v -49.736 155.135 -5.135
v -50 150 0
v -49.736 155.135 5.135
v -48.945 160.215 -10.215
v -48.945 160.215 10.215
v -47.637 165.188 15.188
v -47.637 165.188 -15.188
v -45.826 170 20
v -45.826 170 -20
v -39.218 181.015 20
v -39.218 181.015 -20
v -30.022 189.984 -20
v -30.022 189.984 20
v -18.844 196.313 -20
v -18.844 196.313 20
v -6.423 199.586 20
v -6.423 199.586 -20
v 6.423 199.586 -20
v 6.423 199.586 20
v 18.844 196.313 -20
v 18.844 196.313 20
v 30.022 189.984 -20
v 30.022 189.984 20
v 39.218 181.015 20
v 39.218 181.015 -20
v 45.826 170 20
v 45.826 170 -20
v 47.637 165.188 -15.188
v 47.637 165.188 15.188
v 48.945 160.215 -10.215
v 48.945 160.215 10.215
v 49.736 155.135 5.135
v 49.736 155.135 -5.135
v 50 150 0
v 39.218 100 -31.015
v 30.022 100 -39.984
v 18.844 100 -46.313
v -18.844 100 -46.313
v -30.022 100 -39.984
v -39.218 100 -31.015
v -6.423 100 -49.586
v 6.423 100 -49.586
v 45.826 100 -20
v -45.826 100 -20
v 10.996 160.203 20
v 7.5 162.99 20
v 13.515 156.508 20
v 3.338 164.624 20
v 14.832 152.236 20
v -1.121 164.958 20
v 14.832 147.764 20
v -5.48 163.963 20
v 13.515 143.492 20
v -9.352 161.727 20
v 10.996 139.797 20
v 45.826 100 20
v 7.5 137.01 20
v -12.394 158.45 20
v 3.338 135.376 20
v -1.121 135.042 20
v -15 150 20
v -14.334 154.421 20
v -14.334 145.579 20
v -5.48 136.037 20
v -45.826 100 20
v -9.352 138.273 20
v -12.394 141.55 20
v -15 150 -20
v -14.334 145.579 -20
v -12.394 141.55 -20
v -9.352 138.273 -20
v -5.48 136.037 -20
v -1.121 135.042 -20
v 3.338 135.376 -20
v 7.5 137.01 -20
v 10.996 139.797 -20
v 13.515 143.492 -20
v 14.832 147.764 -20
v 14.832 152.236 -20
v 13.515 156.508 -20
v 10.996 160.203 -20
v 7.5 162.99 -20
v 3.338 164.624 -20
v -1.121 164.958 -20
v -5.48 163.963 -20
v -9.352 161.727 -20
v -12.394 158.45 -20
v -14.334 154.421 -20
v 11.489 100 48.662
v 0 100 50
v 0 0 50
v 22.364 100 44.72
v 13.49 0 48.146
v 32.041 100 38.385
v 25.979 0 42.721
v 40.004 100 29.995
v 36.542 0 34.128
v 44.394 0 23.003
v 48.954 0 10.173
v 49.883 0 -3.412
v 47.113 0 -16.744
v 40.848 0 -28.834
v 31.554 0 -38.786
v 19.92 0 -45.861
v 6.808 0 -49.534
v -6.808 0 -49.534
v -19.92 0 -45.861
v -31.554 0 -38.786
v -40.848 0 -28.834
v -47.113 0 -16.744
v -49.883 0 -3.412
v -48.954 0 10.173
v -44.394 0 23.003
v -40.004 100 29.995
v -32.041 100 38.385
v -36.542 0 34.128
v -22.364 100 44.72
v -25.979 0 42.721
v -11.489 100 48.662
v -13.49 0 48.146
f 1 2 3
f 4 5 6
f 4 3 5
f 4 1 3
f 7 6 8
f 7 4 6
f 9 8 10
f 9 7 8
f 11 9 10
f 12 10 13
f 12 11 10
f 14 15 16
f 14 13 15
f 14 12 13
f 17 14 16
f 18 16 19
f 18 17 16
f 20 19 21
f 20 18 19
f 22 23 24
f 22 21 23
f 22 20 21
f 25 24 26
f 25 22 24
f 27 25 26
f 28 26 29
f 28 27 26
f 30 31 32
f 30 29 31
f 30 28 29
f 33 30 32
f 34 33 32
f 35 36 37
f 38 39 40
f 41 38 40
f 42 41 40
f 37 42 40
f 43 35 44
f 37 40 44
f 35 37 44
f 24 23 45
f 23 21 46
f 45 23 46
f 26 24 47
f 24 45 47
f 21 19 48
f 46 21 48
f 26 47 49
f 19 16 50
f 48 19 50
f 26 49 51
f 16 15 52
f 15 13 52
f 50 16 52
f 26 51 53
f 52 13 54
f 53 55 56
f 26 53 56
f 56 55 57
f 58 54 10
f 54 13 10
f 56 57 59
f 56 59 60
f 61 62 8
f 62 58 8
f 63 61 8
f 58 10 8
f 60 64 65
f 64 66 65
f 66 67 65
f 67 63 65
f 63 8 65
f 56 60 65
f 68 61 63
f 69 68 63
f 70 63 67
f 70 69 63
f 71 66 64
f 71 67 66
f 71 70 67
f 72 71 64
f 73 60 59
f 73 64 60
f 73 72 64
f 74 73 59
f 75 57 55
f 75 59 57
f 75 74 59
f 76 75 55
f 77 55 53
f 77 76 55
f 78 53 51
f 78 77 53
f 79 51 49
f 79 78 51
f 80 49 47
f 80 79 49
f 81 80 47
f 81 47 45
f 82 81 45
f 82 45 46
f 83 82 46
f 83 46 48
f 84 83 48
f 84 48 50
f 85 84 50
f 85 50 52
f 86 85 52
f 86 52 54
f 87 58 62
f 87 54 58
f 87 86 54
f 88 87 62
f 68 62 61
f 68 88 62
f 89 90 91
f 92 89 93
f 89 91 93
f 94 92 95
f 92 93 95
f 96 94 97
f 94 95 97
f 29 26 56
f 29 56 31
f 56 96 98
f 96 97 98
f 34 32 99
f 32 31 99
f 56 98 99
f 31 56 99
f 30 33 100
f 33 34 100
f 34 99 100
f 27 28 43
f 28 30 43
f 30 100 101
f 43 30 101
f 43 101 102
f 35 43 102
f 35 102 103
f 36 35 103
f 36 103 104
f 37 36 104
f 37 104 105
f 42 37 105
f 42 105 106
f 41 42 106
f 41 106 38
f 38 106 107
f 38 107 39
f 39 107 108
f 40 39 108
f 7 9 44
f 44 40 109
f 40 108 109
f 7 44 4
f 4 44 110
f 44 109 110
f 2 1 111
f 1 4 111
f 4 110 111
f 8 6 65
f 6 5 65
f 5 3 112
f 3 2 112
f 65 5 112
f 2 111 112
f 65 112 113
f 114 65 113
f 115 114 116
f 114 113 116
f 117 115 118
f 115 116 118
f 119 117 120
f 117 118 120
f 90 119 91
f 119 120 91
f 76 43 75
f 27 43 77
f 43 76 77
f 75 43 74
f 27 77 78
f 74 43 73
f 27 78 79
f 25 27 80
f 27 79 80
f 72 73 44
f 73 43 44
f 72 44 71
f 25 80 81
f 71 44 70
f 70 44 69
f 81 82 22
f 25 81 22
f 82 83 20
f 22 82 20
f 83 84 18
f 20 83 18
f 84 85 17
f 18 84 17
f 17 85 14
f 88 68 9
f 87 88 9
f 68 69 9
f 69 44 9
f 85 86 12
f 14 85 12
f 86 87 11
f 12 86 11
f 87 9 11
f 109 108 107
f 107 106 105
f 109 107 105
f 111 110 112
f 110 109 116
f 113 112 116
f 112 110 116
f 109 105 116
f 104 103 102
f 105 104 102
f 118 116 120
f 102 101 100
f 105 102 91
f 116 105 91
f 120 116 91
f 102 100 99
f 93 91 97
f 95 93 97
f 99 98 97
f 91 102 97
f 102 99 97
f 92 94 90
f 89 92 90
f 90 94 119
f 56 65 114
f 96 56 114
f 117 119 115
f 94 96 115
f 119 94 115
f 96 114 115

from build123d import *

# Parameters (mm, degrees)
SKETCH_1_R               = 50
EXTRUDE_1_DEPTH          = 200
CUT_EXTRUDE_1_DEPTH      = 200
CUT_EXTRUDE_1_DEPTH_BACK = 200
CUT_EXTRUDE_4_DEPTH      = 200
CUT_EXTRUDE_4_DEPTH_BACK = 200
CUT_EXTRUDE_5_DEPTH      = 200
CUT_EXTRUDE_5_DEPTH_BACK = 200
SKETCH_5_R               = 15


with BuildPart() as part:
    # 草图1 → 凸台-拉伸1 (new body)
    with BuildSketch(Plane(origin=(0, 0, 0), x_dir=(1, 0, 0), z_dir=(0, 1, 0))):
        Circle(SKETCH_1_R)
    extrude(amount=EXTRUDE_1_DEPTH)

    # 草图2 → 切除-拉伸1 (cut, two sides: drawn at the far end of the back side and taken through both)
    with BuildSketch(Plane(origin=(0, 0, 0), x_dir=(0, 0, -1), z_dir=(1, 0, 0)).offset(-CUT_EXTRUDE_1_DEPTH_BACK)):
        Polygon((-70, 250), (70, 250), (70, 100), (20, 100), (20, 240), (-20, 240), (-20, 100), (-70, 100), align=None)
    extrude(amount=CUT_EXTRUDE_1_DEPTH + CUT_EXTRUDE_1_DEPTH_BACK, mode=Mode.SUBTRACT)

    # 草图3 → 切除-拉伸4 (cut, two sides: drawn at the far end of the back side and taken through both)
    with BuildSketch(Plane.XY.offset(20).offset(-CUT_EXTRUDE_4_DEPTH_BACK)):
        with BuildLine():
            Line((50, 150), (108.18036677, 150))
            Line((108.18036677, 150), (108.18036677, 270))
            Line((108.18036677, 270), (-86.328849113, 270))
            Line((-86.328849113, 270), (-86.328849113, 150))
            Line((-86.328849113, 150), (-50, 150))
            ThreePointArc((-50, 150), (0, 200), (50, 150))
        make_face()
    extrude(amount=CUT_EXTRUDE_4_DEPTH + CUT_EXTRUDE_4_DEPTH_BACK, mode=Mode.SUBTRACT)

    # 草图5 → 切除-拉伸5 (cut, two sides: drawn at the far end of the back side and taken through both)
    with BuildSketch(Plane.XY.offset(20).offset(-CUT_EXTRUDE_5_DEPTH_BACK)):
        with Locations((0, 150)):
            Circle(SKETCH_5_R)
    extrude(amount=CUT_EXTRUDE_5_DEPTH + CUT_EXTRUDE_5_DEPTH_BACK, mode=Mode.SUBTRACT)


solid = part.part
